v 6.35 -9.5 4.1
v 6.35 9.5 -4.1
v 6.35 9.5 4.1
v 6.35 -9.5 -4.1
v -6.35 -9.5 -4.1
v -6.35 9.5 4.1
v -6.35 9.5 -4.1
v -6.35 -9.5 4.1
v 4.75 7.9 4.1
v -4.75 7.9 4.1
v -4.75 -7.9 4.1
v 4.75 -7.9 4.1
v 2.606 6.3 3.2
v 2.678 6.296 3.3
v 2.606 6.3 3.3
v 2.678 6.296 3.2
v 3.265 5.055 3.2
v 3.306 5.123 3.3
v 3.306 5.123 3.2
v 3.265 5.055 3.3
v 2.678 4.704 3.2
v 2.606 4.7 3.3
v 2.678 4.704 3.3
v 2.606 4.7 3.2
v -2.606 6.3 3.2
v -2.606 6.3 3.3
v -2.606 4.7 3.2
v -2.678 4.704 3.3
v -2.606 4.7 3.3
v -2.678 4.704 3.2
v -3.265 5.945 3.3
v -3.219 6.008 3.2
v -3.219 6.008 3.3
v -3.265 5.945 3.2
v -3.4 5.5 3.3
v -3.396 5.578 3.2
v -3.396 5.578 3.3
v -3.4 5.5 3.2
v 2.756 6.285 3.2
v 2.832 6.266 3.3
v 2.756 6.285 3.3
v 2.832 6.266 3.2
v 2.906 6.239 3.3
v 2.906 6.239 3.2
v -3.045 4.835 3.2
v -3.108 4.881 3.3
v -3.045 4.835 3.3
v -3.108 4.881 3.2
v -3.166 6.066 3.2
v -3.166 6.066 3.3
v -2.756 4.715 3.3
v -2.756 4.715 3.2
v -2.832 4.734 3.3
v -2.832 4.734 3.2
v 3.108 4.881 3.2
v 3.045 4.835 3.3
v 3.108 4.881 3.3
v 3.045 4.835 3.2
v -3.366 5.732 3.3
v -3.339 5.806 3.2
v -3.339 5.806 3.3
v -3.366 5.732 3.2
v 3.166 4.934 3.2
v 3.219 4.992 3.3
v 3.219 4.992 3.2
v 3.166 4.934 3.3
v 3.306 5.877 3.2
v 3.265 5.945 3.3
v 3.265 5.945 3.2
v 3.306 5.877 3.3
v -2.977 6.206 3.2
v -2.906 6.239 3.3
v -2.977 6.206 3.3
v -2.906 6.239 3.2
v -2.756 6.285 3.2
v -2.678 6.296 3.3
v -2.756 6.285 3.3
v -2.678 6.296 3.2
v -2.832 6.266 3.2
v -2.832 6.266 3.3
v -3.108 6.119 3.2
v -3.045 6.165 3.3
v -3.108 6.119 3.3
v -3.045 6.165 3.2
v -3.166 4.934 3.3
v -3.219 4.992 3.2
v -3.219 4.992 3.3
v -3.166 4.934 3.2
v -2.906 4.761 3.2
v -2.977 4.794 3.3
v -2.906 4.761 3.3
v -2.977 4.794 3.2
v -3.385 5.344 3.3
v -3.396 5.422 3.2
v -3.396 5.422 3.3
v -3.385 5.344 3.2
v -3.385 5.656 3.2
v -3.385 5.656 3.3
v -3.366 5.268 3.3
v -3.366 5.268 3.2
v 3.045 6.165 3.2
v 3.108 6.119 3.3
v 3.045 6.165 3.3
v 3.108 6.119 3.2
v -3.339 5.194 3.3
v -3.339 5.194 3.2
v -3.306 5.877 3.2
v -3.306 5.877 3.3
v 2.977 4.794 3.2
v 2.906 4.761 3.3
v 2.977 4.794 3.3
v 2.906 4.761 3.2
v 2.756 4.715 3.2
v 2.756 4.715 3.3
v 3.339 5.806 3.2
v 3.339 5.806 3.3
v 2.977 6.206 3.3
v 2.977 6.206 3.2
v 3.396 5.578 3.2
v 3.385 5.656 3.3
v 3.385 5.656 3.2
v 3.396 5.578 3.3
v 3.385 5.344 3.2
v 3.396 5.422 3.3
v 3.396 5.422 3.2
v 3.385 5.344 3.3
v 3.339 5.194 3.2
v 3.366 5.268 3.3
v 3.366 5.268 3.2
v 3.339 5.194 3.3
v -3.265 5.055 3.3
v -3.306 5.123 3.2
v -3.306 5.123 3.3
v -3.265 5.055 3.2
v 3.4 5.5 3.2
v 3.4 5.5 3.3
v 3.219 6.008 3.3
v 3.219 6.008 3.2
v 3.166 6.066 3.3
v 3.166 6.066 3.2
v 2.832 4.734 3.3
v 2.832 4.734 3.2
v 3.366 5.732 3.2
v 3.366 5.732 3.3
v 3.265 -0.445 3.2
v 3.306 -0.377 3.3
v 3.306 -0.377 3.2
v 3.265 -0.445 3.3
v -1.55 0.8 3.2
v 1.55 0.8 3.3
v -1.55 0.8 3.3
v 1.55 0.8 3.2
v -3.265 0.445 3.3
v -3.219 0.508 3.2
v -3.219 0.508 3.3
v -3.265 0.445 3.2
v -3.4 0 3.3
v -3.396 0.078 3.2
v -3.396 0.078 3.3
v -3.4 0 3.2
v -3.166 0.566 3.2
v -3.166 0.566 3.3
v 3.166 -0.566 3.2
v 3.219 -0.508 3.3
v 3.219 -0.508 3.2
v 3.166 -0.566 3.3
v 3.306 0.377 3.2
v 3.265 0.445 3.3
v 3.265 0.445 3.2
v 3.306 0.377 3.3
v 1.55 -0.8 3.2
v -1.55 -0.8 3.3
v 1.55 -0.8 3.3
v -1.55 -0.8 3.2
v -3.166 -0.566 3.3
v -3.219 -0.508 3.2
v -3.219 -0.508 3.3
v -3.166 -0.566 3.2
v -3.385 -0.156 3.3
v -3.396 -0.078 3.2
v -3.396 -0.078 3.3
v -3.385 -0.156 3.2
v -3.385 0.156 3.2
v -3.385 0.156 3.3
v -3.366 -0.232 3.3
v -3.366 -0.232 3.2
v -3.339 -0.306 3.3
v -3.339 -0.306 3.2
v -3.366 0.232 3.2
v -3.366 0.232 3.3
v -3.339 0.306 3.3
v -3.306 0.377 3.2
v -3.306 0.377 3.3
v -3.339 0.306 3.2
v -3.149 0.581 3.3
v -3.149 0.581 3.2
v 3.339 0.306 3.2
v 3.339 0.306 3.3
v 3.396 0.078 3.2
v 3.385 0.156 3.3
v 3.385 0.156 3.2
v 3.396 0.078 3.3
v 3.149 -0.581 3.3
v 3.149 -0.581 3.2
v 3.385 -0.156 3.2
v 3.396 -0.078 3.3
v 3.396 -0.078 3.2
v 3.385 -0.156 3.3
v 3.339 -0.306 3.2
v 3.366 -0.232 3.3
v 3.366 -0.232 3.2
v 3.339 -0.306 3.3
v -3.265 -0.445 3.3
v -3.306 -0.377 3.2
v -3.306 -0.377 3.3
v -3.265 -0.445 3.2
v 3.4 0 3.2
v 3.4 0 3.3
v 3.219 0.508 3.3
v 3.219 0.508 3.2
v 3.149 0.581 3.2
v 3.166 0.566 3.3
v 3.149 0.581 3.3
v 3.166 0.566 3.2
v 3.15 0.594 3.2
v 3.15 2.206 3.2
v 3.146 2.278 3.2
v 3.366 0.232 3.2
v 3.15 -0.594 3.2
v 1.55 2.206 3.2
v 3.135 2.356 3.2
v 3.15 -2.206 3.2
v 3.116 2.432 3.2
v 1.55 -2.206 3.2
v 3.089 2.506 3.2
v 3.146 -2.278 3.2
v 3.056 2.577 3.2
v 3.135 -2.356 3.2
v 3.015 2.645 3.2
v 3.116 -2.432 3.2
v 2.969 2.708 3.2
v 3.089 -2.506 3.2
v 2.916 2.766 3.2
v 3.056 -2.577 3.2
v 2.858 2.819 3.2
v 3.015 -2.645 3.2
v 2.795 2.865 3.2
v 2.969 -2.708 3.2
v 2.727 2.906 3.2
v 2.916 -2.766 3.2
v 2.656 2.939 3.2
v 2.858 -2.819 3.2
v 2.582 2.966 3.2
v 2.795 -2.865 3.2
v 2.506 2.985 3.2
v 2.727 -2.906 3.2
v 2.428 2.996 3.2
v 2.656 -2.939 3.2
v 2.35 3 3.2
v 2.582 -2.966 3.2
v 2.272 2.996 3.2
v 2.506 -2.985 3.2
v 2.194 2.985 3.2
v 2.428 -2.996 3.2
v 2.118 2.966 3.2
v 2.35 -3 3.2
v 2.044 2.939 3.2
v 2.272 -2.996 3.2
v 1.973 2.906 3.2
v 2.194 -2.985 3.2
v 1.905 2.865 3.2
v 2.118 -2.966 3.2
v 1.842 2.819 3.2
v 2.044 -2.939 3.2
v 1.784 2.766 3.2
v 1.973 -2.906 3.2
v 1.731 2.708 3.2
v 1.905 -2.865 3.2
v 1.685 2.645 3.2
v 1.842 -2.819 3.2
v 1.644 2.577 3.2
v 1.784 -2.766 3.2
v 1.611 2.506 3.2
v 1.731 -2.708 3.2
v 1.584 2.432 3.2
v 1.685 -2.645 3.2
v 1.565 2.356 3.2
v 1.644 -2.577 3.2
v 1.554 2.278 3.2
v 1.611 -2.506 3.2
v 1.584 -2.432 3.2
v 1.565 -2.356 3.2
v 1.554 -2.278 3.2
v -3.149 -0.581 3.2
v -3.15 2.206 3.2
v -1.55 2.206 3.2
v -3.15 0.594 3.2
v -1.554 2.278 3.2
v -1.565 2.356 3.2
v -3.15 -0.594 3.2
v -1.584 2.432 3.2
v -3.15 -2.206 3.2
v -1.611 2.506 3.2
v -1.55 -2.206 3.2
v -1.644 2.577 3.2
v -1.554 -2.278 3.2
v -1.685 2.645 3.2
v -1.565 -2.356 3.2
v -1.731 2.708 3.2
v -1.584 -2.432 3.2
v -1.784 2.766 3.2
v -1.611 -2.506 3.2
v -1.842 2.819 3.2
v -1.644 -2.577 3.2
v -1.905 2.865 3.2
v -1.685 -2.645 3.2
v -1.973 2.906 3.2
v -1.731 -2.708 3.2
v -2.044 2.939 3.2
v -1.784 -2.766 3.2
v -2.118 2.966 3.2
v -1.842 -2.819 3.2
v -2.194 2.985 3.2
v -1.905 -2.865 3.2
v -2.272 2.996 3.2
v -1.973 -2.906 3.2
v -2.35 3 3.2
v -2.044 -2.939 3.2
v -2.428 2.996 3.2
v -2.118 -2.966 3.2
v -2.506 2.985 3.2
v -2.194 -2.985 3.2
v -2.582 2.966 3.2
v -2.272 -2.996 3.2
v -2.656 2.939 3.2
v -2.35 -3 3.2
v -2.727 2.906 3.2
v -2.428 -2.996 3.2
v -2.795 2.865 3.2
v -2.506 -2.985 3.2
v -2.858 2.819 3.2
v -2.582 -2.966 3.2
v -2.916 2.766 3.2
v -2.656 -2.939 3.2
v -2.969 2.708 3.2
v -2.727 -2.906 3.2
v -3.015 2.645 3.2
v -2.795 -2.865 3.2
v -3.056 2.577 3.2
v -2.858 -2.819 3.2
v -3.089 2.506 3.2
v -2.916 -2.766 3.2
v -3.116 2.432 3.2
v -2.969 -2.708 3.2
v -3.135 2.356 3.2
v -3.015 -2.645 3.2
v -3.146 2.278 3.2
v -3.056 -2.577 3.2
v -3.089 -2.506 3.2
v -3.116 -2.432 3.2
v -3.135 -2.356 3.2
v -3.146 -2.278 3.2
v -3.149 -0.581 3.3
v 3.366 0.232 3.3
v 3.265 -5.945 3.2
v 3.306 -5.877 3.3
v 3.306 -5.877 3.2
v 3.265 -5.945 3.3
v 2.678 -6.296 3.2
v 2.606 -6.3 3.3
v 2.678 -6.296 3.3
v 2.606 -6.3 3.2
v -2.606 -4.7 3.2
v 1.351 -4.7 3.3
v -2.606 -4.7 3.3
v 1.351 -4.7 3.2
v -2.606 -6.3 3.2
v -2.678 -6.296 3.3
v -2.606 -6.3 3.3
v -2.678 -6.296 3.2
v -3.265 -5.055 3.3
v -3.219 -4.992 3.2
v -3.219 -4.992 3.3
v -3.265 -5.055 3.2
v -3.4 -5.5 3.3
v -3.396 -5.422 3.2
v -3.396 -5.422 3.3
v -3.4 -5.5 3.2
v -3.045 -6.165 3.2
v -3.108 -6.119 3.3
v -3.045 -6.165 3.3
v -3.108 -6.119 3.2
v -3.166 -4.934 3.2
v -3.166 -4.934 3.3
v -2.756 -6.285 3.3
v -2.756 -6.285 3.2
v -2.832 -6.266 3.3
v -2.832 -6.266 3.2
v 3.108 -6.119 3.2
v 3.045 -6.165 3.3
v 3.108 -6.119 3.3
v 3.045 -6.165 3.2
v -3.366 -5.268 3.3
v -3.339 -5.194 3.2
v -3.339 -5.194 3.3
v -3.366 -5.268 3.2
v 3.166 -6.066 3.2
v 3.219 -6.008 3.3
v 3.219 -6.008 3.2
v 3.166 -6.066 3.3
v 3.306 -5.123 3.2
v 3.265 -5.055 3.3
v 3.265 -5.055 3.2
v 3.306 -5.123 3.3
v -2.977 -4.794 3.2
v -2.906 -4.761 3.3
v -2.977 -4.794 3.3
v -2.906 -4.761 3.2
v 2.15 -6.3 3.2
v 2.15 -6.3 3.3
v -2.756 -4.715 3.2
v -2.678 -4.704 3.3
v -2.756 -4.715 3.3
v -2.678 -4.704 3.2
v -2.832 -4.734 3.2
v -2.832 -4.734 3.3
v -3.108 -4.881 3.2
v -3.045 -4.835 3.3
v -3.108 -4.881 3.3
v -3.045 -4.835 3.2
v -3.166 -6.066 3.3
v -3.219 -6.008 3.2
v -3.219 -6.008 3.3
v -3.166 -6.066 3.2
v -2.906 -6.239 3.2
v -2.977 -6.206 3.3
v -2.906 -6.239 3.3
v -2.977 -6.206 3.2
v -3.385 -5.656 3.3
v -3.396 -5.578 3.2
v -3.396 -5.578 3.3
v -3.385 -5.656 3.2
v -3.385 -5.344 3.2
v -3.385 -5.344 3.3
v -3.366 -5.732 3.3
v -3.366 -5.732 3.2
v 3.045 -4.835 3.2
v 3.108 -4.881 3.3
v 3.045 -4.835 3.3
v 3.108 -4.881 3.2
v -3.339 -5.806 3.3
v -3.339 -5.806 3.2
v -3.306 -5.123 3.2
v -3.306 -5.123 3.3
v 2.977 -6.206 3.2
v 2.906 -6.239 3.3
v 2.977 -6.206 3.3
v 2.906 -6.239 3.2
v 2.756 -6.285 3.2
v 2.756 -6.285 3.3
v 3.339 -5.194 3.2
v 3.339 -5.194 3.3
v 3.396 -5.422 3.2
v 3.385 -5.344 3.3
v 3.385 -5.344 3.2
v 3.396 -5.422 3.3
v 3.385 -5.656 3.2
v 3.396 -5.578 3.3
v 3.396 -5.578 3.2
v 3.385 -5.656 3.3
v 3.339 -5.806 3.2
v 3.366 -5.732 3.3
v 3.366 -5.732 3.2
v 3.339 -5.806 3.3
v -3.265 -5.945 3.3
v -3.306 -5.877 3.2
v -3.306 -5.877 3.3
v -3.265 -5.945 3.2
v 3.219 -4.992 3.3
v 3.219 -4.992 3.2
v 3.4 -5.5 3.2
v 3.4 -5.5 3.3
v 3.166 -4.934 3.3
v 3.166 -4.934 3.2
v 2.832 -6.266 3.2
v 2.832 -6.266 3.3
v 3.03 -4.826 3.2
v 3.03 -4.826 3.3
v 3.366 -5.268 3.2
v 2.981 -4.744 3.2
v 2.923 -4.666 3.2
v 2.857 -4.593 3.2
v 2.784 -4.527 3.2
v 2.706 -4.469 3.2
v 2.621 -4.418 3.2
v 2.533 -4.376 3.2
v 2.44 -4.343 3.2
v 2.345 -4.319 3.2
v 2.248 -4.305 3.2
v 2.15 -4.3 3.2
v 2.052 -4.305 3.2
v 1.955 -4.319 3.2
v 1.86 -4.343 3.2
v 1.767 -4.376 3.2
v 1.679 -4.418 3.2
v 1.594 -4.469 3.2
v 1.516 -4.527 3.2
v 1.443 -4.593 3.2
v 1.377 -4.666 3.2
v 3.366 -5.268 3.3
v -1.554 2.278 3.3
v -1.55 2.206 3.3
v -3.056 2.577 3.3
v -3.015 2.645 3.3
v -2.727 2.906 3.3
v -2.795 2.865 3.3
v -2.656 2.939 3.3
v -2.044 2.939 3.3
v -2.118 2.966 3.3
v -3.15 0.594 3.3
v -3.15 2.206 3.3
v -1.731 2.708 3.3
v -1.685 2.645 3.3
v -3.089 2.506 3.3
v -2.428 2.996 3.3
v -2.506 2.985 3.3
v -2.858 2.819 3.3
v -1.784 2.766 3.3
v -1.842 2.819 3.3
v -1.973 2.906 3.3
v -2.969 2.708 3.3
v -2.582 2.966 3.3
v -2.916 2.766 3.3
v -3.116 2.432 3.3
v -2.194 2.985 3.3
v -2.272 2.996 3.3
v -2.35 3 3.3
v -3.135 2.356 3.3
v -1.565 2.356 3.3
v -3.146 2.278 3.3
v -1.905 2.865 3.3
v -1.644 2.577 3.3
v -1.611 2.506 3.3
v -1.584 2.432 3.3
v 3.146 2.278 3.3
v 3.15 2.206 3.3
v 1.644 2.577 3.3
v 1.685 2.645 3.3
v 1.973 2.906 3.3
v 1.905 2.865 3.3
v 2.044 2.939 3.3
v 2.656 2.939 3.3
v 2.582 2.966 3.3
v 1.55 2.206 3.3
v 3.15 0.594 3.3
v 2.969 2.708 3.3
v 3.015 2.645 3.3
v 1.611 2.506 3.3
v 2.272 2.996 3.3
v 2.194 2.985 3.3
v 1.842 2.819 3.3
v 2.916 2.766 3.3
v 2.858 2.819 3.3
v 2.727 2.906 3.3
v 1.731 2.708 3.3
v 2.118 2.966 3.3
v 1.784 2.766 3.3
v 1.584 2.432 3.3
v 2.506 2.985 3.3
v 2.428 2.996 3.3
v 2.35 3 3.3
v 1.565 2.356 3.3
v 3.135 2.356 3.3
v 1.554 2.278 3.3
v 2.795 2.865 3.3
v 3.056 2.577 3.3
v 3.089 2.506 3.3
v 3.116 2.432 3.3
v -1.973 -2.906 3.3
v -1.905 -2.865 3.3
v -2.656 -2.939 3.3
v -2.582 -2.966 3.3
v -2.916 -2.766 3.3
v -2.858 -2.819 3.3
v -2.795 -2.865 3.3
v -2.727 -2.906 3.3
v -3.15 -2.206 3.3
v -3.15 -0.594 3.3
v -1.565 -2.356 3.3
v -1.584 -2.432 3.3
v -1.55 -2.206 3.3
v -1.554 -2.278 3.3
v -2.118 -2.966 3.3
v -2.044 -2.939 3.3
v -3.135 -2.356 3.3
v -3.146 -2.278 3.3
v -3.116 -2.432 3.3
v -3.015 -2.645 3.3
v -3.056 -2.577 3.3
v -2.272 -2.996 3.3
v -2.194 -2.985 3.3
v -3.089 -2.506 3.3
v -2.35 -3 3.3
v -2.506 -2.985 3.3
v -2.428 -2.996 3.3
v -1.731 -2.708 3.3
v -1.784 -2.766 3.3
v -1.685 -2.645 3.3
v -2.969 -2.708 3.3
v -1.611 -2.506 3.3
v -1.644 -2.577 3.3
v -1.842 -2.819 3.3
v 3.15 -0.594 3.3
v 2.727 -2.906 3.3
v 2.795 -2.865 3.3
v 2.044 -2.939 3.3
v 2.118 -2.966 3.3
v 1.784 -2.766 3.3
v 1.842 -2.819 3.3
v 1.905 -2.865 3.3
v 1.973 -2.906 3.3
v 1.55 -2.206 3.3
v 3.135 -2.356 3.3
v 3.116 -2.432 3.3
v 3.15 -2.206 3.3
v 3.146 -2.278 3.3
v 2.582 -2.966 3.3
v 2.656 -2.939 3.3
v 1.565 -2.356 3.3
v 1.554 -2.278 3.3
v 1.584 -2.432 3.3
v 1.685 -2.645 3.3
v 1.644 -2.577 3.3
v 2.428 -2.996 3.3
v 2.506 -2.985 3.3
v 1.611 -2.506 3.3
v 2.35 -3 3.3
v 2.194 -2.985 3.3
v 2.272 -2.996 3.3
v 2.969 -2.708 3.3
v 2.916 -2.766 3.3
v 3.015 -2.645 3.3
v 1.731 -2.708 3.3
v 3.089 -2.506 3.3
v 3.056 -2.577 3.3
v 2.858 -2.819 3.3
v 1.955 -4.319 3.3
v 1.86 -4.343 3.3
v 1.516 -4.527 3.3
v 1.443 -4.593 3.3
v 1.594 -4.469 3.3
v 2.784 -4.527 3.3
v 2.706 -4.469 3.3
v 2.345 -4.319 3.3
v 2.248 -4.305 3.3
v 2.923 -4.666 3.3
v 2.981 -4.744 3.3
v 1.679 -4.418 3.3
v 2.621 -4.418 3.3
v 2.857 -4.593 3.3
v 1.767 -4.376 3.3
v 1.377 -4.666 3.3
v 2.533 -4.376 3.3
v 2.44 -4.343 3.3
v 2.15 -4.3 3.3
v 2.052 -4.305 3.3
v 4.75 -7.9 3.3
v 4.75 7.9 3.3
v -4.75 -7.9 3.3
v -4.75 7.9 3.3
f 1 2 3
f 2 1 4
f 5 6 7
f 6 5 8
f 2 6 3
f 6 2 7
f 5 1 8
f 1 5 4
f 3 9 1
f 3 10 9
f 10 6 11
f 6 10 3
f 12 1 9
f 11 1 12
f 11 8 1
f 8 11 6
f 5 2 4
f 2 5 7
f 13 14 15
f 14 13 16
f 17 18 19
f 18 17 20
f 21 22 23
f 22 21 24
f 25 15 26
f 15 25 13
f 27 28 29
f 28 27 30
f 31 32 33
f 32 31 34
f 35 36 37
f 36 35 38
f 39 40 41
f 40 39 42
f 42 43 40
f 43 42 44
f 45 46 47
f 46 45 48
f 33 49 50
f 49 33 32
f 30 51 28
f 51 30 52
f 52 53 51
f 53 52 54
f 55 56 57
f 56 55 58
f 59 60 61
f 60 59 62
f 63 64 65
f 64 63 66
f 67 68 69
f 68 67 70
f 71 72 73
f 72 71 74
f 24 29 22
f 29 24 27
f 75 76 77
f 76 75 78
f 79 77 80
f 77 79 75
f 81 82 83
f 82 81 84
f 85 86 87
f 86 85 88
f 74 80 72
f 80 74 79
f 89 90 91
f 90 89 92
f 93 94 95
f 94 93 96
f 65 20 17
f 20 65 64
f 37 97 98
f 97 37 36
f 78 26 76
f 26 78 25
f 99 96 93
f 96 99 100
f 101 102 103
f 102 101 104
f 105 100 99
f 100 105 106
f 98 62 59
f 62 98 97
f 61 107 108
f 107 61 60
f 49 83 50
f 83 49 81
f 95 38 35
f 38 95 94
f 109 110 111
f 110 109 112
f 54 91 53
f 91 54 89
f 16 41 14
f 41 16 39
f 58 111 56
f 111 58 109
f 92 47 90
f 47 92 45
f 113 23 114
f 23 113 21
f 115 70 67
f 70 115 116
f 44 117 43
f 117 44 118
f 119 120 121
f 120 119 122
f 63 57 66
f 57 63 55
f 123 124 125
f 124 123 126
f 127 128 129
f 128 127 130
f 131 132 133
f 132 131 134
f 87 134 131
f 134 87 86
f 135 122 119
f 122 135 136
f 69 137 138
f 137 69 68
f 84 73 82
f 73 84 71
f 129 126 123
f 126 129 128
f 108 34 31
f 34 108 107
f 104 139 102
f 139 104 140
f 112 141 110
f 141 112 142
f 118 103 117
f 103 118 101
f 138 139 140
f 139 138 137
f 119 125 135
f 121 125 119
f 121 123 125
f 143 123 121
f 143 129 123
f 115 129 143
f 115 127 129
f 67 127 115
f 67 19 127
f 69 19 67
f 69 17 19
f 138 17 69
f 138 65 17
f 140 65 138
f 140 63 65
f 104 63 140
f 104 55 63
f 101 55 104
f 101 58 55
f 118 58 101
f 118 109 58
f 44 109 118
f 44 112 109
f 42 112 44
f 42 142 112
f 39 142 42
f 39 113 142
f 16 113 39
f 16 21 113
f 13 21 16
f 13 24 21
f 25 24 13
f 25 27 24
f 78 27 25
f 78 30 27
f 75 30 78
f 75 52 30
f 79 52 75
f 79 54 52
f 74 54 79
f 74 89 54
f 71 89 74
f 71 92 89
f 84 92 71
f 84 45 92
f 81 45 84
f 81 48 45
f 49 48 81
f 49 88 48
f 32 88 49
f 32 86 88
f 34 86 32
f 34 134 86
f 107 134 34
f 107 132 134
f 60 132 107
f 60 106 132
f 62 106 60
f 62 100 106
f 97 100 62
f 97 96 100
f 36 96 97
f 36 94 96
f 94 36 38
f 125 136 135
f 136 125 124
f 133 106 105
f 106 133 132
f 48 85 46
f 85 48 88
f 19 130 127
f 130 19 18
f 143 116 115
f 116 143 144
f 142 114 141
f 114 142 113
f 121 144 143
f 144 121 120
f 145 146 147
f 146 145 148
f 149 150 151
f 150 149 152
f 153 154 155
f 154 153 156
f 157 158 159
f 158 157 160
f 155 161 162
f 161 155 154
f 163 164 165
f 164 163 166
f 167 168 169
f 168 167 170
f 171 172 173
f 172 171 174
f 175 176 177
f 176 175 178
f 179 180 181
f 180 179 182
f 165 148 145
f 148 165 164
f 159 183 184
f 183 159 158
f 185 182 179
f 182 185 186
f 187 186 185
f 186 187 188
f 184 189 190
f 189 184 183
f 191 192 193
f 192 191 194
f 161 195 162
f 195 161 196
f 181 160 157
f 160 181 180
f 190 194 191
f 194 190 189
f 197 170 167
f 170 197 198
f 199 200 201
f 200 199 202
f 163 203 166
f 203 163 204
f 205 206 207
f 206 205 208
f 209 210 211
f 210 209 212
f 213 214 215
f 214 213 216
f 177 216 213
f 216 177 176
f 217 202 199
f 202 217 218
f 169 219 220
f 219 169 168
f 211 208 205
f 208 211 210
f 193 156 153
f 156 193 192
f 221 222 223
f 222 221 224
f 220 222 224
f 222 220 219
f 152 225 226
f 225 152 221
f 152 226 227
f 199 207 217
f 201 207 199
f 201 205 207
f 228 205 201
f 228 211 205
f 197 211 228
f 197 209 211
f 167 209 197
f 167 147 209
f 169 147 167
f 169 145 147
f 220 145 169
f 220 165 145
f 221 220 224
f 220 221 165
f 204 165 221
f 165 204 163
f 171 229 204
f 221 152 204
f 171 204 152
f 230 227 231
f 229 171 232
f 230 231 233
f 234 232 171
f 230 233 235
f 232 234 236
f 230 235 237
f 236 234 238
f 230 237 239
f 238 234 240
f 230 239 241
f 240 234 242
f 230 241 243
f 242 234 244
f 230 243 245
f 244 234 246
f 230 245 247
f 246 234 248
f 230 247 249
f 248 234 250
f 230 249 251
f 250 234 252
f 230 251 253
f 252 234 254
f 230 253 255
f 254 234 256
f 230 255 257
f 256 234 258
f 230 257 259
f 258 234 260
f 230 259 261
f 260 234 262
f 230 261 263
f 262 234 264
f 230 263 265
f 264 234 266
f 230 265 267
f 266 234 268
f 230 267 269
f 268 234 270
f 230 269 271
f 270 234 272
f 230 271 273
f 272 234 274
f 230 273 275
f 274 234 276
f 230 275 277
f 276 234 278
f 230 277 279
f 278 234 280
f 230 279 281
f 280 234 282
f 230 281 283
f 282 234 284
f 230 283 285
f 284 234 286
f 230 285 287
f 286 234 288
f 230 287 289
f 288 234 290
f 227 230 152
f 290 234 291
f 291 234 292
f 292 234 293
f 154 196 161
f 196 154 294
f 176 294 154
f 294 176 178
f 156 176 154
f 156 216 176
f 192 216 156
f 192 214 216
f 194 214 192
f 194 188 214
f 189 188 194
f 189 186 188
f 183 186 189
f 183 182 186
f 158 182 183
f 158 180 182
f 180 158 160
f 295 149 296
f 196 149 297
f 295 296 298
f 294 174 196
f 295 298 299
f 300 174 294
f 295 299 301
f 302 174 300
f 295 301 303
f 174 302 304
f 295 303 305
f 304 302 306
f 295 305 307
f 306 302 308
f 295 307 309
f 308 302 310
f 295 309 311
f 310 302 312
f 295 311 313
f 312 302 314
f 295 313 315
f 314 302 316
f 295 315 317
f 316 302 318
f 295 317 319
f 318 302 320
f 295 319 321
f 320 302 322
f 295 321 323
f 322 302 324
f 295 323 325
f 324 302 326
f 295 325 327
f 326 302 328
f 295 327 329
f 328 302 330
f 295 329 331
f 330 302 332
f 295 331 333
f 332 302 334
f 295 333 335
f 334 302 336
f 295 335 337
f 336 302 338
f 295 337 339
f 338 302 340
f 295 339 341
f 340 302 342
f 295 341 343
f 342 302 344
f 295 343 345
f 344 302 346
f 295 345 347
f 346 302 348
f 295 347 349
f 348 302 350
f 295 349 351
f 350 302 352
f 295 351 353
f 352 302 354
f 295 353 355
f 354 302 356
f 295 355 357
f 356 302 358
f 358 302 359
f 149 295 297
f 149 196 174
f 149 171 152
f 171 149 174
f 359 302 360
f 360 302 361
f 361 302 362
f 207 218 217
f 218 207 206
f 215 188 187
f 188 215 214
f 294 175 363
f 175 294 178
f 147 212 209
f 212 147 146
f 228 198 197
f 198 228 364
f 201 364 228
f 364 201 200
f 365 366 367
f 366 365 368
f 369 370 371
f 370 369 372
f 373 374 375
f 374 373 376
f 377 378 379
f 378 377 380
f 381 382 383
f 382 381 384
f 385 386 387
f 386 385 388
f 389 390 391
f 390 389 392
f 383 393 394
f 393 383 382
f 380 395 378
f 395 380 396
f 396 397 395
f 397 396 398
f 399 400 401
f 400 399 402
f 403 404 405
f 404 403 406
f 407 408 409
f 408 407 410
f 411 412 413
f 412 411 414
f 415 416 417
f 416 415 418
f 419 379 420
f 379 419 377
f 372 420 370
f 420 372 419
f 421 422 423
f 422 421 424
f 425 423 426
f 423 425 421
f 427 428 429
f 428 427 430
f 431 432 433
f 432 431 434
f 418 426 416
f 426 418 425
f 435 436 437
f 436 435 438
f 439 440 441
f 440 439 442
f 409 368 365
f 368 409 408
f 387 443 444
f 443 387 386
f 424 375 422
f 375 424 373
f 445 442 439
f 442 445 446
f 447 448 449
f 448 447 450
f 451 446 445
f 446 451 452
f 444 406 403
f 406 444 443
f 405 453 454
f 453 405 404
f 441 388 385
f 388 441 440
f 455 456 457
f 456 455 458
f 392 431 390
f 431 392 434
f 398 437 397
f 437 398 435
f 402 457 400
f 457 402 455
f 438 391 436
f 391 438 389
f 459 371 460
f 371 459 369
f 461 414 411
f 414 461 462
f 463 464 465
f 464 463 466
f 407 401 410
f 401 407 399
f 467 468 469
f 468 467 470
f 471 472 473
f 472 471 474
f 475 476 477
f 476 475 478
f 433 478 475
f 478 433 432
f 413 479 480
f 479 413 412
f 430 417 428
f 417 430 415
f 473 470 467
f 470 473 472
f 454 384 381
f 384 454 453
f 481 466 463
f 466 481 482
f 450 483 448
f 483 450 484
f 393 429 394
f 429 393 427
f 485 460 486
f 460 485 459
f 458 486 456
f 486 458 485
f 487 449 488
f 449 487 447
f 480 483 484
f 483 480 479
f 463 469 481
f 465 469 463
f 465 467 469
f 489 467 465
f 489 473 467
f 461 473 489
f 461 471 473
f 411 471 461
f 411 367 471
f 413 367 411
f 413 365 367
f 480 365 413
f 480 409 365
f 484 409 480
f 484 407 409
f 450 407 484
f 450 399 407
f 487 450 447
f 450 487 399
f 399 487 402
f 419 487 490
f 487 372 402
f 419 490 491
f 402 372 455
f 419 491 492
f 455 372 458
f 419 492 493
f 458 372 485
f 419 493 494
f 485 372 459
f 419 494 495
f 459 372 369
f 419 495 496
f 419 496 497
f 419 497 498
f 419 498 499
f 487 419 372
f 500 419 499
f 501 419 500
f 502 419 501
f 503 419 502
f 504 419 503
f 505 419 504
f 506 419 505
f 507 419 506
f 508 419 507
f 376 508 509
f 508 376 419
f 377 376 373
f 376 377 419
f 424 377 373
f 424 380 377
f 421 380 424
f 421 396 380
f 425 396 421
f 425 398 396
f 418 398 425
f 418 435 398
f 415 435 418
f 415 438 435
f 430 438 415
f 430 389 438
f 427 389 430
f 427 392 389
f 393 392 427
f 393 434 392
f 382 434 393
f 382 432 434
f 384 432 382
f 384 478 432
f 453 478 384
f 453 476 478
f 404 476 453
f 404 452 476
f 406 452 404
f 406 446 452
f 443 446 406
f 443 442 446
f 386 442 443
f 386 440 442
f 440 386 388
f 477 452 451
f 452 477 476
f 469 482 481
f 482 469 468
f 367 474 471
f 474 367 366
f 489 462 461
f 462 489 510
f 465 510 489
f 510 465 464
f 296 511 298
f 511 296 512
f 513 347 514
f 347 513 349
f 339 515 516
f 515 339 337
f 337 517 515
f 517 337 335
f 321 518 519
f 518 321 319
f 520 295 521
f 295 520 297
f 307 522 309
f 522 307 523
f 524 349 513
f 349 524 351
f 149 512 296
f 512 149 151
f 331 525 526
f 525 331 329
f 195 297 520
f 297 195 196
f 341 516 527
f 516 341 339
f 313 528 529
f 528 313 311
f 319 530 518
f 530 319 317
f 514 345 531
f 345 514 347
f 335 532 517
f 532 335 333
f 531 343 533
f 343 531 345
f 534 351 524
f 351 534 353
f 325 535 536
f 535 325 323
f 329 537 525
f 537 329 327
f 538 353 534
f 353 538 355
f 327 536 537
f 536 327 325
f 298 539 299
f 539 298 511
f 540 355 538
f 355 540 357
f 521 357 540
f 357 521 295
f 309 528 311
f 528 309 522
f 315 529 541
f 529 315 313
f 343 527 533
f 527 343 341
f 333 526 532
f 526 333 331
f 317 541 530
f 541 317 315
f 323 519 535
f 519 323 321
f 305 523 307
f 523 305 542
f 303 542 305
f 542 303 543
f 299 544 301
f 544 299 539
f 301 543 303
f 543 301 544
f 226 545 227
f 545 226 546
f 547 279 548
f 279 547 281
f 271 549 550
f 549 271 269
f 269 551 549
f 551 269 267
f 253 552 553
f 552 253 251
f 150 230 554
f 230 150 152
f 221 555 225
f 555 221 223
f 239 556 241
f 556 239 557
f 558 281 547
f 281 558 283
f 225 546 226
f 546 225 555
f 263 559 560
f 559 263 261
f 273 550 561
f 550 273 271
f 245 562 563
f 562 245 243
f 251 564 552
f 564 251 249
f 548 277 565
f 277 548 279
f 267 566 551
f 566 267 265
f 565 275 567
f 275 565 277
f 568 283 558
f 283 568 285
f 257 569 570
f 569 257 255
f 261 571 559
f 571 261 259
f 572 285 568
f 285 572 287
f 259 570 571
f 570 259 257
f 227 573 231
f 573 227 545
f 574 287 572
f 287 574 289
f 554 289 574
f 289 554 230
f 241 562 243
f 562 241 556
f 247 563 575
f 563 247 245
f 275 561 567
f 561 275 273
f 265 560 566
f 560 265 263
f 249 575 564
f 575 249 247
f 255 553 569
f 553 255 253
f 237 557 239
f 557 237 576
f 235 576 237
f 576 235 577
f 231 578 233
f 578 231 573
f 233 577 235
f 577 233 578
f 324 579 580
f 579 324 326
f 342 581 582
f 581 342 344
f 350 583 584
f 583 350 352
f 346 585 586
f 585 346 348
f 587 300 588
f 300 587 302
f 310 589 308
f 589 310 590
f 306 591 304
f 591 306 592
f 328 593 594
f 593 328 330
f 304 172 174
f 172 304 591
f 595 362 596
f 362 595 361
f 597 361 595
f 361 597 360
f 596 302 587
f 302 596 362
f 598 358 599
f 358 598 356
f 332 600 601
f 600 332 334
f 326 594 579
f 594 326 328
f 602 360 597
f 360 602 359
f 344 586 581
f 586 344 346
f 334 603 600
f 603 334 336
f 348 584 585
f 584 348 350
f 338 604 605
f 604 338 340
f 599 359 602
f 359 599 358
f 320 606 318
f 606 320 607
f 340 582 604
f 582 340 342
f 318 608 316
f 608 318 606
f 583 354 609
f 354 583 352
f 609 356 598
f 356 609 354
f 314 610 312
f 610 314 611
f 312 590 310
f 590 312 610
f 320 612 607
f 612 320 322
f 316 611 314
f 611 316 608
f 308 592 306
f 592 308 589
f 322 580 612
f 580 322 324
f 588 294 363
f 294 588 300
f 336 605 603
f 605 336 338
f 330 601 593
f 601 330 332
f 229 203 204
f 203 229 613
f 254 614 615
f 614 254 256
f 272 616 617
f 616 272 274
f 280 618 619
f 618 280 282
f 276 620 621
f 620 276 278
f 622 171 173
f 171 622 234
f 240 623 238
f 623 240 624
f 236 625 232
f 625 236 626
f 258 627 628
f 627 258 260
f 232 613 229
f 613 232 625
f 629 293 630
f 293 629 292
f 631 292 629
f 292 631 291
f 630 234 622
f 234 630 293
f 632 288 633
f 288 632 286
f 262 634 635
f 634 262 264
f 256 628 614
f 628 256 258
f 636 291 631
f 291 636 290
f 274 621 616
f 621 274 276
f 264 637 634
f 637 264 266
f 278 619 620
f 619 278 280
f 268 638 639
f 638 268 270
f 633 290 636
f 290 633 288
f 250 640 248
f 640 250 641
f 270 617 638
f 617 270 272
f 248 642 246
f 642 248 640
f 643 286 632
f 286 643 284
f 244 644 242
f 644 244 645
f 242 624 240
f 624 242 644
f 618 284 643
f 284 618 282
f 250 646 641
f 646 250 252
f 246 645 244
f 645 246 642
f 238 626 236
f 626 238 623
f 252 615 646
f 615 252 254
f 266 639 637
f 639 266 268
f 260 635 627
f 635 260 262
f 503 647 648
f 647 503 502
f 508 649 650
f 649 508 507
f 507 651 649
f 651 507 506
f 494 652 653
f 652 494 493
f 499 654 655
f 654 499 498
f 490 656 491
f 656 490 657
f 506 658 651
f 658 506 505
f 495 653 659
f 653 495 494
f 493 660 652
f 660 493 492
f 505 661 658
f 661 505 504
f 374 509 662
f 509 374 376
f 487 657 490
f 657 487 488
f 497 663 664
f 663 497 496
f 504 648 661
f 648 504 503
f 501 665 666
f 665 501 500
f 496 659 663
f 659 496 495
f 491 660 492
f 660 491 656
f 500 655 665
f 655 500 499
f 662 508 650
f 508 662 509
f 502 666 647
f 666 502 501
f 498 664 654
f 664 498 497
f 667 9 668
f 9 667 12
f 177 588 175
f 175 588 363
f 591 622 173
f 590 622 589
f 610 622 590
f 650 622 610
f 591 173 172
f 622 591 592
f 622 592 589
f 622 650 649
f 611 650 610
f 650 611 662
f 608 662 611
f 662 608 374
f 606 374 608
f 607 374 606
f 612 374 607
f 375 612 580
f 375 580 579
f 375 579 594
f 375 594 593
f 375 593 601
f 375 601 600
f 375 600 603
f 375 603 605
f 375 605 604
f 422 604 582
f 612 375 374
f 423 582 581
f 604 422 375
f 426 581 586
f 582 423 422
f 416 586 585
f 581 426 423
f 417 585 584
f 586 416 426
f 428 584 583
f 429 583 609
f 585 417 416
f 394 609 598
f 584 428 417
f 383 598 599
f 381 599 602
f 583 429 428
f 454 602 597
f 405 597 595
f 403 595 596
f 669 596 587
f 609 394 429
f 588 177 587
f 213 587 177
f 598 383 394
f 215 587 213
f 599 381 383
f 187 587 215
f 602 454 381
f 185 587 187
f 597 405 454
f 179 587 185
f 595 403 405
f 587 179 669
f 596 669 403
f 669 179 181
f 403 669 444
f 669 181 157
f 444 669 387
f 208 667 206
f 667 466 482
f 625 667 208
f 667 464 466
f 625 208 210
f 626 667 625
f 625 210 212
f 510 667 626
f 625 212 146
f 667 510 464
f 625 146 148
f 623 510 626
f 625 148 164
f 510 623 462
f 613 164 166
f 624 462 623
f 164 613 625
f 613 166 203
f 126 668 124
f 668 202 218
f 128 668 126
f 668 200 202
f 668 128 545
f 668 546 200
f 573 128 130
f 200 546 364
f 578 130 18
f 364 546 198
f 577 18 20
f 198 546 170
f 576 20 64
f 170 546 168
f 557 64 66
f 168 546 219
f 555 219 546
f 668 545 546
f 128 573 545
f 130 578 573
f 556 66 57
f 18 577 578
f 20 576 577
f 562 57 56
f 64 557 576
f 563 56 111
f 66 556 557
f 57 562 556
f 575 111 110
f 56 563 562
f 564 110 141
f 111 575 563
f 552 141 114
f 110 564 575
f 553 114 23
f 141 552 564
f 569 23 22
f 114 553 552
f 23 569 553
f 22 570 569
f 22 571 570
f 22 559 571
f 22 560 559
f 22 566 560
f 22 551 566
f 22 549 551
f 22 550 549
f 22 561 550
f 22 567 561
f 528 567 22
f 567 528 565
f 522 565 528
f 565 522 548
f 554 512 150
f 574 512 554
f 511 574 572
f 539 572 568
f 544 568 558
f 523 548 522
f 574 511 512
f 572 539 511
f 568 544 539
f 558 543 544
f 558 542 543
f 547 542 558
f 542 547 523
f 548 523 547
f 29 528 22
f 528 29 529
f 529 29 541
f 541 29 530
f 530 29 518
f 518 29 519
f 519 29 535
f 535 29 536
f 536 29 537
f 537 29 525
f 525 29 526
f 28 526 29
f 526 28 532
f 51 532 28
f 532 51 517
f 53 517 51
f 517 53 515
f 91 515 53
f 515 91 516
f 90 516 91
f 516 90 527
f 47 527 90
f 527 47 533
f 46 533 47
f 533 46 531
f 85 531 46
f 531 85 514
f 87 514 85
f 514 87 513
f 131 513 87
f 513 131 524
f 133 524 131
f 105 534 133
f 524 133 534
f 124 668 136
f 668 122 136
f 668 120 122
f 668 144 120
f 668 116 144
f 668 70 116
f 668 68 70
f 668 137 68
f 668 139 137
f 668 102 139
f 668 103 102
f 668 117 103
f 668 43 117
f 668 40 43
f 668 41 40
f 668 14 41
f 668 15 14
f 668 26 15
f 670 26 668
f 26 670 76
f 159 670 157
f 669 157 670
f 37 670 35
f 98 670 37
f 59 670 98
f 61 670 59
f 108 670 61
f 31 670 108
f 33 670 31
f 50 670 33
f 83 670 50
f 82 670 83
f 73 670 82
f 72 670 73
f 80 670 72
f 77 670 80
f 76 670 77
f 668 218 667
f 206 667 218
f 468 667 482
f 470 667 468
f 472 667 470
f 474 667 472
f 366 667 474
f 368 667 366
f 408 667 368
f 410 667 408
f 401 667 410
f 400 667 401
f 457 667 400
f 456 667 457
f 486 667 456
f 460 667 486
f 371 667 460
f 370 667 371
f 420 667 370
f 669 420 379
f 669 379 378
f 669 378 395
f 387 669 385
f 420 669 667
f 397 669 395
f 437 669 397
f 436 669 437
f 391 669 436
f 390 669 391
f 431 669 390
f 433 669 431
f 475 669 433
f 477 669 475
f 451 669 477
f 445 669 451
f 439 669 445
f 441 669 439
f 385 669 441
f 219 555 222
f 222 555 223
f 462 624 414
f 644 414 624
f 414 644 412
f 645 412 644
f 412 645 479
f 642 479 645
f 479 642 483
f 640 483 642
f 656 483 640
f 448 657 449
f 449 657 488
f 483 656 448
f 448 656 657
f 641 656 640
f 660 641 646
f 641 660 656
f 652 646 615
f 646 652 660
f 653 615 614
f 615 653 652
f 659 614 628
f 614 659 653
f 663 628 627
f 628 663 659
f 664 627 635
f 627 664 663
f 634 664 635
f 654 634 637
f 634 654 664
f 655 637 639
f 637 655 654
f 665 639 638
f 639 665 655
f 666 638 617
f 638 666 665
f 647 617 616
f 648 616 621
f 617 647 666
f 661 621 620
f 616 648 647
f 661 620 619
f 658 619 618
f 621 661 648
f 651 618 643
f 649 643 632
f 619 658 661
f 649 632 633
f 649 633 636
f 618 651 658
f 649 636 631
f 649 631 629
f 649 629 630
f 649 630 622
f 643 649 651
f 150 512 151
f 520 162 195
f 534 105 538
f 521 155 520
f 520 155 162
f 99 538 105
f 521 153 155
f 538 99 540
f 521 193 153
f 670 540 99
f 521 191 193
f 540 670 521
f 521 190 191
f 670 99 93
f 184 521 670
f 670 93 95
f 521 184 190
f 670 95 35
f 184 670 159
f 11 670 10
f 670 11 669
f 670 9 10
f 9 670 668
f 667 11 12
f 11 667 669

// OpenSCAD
$fn = 64;

// Target overall body dimensions (W, H, D)
body_W = 12.7;  //[6.35:25.4:0.1]
body_H = 19;    //[9.5:38:0.1]
body_D = 8.2;   //[4.1:16.4:0.1]

// Front bezel + window
bezel_frame = 1.2;          //[0.6:2.4:0.1]
bezel_thickness = 1.0;      //[0.5:2.0:0.1]
window_recess_depth = 0.8;  //[0.4:1.6:0.1]
window_clearance = 0.4;     //[0.2:1.0:0.1]

// Segment geometry (RECESSED cutouts so the 7-seg reads clearly in orthographic views)
segment_recess = 0.9;       //[0.4:2.0:0.1]  // depth of segment cut into front
segment_thickness = 1.6;    //[0.8:3.2:0.1]
segment_margin = 1.6;       //[0.8:3.2:0.1]
segment_gap = 1.2;          //[0.6:2.4:0.1]
segment_end_round = 0.55;   //[0.2:1.2:0.05]  // rounded ends for visible "bars"

// Decimal point (optional recessed)
decimal_r = 1.0;            //[0.5:2.0:0.1]
decimal_recess = 0.9;       //[0.4:2.0:0.1]

// Connectivity overlap (keeps booleans watertight)
overlap = 1.2;              //[0.2:2.0:0.1]

// ---- Derived sizes (clamped) ----
bezel_inner_W = max(0.1, body_W - 2*bezel_frame);
bezel_inner_H = max(0.1, body_H - 2*bezel_frame);

win_W = max(0.1, body_W - 2*(bezel_frame + window_clearance));
win_H = max(0.1, body_H - 2*(bezel_frame + window_clearance));

// Segment lengths inside the window area
seg_len = max(0.1, win_W - 2*segment_margin);
seg_v_len = max(
  0.1,
  (win_H - 2*segment_margin - 3*segment_thickness - 2*segment_gap)/2
);

// ---- Base body ----
module display_body() {
  cube([body_W, body_H, body_D], center=true);
}

// Bezel ring on the front face (connected to body with overlap)
module bezel_ring() {
  translate([0, 0, body_D/2 + bezel_thickness/2 - overlap])
    difference() {
      cube([body_W, body_H, bezel_thickness], center=true);
      cube([bezel_inner_W, bezel_inner_H, bezel_thickness + 2*overlap], center=true);
    }
}

// Window recess (a shallow pocket) to frame the segments
module window_recess() {
  // Cut into the front face; ensure it intersects the body by overlap
  translate([0, 0, body_D/2 - window_recess_depth/2 + overlap/2])
    cube([win_W, win_H, window_recess_depth + overlap], center=true);
}

// Rounded "bar" helper (2D rounded rectangle extruded)
module bar_solid(L, T, H, r) {
  rr = min(r, T/2, L/2);
  linear_extrude(height=H, center=true)
    offset(delta=(T/2 - rr))
      hull() {
        translate([-(L/2-rr), 0]) circle(r=rr);
        translate([ (L/2-rr), 0]) circle(r=rr);
      }
}

// 7 segment CUTTERS (recessed into the front face so it reads as a 7-seg)
module segment_cutters() {
  // Center cutters just inside the front face so they definitely subtract
  zc = body_D/2 - segment_recess/2 + overlap/2;

  // Segment placement within the window area
  y_top =  win_H/2 - segment_margin - segment_thickness/2;
  y_mid =  0;
  y_bot = -y_top;

  x_l = -(win_W/2 - segment_margin - segment_thickness/2);
  x_r =  (win_W/2 - segment_margin - segment_thickness/2);

  // Vertical segment centers (upper and lower)
  y_up =  (segment_thickness + segment_gap)/2;
  y_dn = -(segment_thickness + segment_gap)/2;

  // Horizontal segments: a (top), g (middle), d (bottom)
  translate([0, y_top, zc])
    bar_solid(seg_len, segment_thickness, segment_recess + overlap, segment_end_round);

  translate([0, y_mid, zc])
    bar_solid(seg_len, segment_thickness, segment_recess + overlap, segment_end_round);

  translate([0, y_bot, zc])
    bar_solid(seg_len, segment_thickness, segment_recess + overlap, segment_end_round);

  // Vertical segments: f (upper-left), b (upper-right), e (lower-left), c (lower-right)
  translate([x_l, y_up, zc])
    rotate([0,0,90])
      bar_solid(seg_v_len, segment_thickness, segment_recess + overlap, segment_end_round);

  translate([x_r, y_up, zc])
    rotate([0,0,90])
      bar_solid(seg_v_len, segment_thickness, segment_recess + overlap, segment_end_round);

  translate([x_l, y_dn, zc])
    rotate([0,0,90])
      bar_solid(seg_v_len, segment_thickness, segment_recess + overlap, segment_end_round);

  translate([x_r, y_dn, zc])
    rotate([0,0,90])
      bar_solid(seg_v_len, segment_thickness, segment_recess + overlap, segment_end_round);

  // Decimal point (recessed) inside window area
  dp_x =  win_W/2 - segment_margin - decimal_r;
  dp_y = -win_H/2 + segment_margin + decimal_r;

  translate([dp_x, dp_y, body_D/2 - decimal_recess/2 + overlap/2])
    cylinder(r=decimal_r, h=decimal_recess + overlap, center=true);
}

// Final: ONE connected solid (body + bezel) with recessed window + recessed segments
module complete_model() {
  difference() {
    union() {
      display_body();
      bezel_ring();
    }
    // Cut features into the front face so the 7-segment is clearly visible
    window_recess();
    segment_cutters();
  }
}

complete_model();
